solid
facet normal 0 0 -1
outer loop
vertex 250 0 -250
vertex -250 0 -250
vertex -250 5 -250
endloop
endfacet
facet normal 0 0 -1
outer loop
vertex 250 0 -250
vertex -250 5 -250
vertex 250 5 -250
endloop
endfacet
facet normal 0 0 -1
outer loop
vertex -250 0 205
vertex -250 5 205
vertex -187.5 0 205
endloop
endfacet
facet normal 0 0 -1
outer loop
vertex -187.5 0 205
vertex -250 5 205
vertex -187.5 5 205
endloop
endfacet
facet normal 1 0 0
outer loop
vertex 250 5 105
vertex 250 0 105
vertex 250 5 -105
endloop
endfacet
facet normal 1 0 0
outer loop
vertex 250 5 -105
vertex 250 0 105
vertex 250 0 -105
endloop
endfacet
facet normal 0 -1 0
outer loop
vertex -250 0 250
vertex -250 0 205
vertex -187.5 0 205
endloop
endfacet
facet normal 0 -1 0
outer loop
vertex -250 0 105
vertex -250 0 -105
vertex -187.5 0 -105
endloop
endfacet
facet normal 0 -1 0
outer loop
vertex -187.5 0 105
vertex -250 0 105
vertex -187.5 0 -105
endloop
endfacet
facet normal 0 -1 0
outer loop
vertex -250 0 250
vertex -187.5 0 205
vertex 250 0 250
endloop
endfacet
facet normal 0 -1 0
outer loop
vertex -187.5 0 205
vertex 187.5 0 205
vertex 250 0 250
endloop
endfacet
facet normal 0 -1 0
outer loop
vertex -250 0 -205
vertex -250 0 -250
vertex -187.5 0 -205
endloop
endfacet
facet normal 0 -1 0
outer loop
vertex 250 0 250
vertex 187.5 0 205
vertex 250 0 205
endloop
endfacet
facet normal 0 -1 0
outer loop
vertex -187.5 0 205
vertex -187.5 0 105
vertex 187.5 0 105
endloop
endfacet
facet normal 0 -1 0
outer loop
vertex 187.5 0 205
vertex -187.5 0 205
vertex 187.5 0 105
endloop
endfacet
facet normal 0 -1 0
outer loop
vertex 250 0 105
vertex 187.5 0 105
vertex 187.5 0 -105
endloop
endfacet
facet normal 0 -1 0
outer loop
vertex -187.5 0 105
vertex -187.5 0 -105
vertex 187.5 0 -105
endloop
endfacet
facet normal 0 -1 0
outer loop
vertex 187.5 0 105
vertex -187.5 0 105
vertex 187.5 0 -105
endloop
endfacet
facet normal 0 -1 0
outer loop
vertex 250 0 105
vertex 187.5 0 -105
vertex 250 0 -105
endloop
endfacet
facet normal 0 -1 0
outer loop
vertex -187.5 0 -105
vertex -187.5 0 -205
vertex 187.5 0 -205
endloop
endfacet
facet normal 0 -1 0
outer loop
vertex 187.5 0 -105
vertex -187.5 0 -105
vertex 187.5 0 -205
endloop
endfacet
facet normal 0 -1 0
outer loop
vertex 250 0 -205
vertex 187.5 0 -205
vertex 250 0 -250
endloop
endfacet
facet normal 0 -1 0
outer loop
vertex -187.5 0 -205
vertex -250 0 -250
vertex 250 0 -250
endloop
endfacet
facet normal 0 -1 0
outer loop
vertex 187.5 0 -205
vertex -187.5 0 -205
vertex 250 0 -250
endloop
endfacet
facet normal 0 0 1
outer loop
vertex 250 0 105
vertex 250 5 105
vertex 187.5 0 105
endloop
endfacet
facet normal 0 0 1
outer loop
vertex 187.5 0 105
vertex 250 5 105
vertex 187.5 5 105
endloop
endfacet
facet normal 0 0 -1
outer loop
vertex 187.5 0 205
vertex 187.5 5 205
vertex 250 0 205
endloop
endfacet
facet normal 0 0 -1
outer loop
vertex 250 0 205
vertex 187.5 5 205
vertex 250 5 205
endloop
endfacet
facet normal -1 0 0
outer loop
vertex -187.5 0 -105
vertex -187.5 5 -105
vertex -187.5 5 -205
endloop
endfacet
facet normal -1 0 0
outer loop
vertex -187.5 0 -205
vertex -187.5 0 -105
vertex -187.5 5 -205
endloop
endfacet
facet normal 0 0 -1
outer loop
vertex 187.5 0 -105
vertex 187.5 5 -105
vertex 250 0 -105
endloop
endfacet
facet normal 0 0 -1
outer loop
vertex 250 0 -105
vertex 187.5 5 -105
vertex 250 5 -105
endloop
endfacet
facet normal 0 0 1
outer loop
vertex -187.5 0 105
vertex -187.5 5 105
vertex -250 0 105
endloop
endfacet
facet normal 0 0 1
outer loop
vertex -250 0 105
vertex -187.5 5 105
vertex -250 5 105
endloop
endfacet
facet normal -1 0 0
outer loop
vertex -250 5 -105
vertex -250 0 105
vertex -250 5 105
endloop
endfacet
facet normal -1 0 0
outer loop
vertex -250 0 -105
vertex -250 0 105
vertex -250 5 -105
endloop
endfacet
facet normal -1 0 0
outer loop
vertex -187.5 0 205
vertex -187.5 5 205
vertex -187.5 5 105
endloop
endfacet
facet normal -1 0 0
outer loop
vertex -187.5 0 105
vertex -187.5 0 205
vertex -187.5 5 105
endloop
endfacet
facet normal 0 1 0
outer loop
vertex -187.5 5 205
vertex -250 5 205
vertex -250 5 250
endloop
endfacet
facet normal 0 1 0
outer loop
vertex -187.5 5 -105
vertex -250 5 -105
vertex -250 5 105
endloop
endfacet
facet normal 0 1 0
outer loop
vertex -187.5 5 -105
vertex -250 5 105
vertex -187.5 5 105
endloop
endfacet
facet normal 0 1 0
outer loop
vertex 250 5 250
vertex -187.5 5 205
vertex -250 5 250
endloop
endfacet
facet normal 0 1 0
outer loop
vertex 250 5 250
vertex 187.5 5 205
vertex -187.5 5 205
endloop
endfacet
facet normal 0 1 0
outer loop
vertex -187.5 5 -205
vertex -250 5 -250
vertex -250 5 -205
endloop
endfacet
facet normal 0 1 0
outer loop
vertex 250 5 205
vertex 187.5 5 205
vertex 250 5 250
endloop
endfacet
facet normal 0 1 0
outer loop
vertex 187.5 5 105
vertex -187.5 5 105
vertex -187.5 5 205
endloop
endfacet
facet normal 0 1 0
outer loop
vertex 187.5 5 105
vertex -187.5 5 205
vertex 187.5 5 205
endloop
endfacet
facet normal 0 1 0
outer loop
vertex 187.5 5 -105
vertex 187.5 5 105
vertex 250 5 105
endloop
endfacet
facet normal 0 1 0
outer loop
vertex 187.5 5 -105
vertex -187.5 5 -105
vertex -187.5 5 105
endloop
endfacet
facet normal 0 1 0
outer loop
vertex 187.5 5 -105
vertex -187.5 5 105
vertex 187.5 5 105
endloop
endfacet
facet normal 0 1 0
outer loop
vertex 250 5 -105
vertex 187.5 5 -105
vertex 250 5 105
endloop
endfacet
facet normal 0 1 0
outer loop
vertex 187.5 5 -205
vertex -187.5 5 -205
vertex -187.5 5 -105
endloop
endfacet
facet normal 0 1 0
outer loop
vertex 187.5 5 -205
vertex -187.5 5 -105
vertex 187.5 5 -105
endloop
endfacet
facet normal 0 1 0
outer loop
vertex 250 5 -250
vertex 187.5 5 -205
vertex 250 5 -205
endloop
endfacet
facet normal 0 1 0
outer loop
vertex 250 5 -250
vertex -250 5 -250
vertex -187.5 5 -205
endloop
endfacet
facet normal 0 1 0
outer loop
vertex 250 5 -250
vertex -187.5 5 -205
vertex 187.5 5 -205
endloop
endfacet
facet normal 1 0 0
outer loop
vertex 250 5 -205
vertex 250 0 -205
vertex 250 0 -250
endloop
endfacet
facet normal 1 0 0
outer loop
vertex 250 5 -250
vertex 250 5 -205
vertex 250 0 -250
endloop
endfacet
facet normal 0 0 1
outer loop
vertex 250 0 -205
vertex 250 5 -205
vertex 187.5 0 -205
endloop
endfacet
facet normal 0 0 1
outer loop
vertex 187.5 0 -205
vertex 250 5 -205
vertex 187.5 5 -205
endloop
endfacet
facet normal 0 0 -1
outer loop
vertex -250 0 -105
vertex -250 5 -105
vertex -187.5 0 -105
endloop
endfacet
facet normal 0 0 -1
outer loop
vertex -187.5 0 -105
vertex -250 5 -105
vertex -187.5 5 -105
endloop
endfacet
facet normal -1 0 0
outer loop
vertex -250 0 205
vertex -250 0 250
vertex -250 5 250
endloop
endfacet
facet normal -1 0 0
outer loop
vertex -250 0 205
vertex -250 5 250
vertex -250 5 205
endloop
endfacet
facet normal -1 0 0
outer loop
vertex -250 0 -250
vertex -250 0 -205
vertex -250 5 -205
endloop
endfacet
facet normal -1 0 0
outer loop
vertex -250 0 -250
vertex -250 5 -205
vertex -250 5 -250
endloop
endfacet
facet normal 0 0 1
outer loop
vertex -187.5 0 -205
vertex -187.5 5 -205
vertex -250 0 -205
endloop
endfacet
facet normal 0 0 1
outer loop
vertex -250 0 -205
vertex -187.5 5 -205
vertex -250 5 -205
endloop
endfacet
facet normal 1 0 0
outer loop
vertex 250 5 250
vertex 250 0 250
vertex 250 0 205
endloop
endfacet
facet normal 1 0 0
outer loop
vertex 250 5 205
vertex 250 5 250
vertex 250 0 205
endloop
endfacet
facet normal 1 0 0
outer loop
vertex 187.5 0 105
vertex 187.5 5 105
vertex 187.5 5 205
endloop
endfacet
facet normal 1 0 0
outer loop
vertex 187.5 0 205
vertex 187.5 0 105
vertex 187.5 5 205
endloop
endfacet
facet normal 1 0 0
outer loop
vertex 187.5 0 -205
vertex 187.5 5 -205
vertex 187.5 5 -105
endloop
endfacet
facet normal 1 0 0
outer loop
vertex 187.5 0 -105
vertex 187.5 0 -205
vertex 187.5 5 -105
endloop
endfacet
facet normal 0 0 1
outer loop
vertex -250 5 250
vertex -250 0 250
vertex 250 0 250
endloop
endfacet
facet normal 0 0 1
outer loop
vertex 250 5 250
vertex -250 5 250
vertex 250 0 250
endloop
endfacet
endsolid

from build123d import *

# Parameters (mm, degrees)
SKETCH1_W           = 500
SKETCH1_H           = 500
BOSS_EXTRUDE1_DEPTH = 5
CUT_EXTRUDE1_DEPTH  = 5


with BuildPart() as part:
    # Sketch1 → Boss-Extrude1 (new body)
    with BuildSketch(Plane(origin=(0, 0, 0), x_dir=(1, 0, 0), z_dir=(0, 1, 0))):
        Rectangle(SKETCH1_W, SKETCH1_H)
    extrude(amount=BOSS_EXTRUDE1_DEPTH)

    # Sketch3 → Cut-Extrude1 (cut)
    with BuildSketch(Plane(origin=(0, 5, 0), x_dir=(1, 0, 0), z_dir=(0, 1, 0))):
        Polygon((-187.5, 205), (-250, 205), (-250, 155), (-250, 105), (-187.5, 105), align=None)
        Polygon((-187.5, -105), (-250, -105), (-250, -155), (-250, -205), (-187.5, -205), align=None)
        Polygon((250, -155), (250, -105), (187.5, -105), (187.5, -205), (250, -205), align=None)
        Polygon((250, 155), (250, 205), (187.5, 205), (187.5, 105), (250, 105), align=None)
    extrude(amount=-CUT_EXTRUDE1_DEPTH, mode=Mode.SUBTRACT)


solid = part.part
